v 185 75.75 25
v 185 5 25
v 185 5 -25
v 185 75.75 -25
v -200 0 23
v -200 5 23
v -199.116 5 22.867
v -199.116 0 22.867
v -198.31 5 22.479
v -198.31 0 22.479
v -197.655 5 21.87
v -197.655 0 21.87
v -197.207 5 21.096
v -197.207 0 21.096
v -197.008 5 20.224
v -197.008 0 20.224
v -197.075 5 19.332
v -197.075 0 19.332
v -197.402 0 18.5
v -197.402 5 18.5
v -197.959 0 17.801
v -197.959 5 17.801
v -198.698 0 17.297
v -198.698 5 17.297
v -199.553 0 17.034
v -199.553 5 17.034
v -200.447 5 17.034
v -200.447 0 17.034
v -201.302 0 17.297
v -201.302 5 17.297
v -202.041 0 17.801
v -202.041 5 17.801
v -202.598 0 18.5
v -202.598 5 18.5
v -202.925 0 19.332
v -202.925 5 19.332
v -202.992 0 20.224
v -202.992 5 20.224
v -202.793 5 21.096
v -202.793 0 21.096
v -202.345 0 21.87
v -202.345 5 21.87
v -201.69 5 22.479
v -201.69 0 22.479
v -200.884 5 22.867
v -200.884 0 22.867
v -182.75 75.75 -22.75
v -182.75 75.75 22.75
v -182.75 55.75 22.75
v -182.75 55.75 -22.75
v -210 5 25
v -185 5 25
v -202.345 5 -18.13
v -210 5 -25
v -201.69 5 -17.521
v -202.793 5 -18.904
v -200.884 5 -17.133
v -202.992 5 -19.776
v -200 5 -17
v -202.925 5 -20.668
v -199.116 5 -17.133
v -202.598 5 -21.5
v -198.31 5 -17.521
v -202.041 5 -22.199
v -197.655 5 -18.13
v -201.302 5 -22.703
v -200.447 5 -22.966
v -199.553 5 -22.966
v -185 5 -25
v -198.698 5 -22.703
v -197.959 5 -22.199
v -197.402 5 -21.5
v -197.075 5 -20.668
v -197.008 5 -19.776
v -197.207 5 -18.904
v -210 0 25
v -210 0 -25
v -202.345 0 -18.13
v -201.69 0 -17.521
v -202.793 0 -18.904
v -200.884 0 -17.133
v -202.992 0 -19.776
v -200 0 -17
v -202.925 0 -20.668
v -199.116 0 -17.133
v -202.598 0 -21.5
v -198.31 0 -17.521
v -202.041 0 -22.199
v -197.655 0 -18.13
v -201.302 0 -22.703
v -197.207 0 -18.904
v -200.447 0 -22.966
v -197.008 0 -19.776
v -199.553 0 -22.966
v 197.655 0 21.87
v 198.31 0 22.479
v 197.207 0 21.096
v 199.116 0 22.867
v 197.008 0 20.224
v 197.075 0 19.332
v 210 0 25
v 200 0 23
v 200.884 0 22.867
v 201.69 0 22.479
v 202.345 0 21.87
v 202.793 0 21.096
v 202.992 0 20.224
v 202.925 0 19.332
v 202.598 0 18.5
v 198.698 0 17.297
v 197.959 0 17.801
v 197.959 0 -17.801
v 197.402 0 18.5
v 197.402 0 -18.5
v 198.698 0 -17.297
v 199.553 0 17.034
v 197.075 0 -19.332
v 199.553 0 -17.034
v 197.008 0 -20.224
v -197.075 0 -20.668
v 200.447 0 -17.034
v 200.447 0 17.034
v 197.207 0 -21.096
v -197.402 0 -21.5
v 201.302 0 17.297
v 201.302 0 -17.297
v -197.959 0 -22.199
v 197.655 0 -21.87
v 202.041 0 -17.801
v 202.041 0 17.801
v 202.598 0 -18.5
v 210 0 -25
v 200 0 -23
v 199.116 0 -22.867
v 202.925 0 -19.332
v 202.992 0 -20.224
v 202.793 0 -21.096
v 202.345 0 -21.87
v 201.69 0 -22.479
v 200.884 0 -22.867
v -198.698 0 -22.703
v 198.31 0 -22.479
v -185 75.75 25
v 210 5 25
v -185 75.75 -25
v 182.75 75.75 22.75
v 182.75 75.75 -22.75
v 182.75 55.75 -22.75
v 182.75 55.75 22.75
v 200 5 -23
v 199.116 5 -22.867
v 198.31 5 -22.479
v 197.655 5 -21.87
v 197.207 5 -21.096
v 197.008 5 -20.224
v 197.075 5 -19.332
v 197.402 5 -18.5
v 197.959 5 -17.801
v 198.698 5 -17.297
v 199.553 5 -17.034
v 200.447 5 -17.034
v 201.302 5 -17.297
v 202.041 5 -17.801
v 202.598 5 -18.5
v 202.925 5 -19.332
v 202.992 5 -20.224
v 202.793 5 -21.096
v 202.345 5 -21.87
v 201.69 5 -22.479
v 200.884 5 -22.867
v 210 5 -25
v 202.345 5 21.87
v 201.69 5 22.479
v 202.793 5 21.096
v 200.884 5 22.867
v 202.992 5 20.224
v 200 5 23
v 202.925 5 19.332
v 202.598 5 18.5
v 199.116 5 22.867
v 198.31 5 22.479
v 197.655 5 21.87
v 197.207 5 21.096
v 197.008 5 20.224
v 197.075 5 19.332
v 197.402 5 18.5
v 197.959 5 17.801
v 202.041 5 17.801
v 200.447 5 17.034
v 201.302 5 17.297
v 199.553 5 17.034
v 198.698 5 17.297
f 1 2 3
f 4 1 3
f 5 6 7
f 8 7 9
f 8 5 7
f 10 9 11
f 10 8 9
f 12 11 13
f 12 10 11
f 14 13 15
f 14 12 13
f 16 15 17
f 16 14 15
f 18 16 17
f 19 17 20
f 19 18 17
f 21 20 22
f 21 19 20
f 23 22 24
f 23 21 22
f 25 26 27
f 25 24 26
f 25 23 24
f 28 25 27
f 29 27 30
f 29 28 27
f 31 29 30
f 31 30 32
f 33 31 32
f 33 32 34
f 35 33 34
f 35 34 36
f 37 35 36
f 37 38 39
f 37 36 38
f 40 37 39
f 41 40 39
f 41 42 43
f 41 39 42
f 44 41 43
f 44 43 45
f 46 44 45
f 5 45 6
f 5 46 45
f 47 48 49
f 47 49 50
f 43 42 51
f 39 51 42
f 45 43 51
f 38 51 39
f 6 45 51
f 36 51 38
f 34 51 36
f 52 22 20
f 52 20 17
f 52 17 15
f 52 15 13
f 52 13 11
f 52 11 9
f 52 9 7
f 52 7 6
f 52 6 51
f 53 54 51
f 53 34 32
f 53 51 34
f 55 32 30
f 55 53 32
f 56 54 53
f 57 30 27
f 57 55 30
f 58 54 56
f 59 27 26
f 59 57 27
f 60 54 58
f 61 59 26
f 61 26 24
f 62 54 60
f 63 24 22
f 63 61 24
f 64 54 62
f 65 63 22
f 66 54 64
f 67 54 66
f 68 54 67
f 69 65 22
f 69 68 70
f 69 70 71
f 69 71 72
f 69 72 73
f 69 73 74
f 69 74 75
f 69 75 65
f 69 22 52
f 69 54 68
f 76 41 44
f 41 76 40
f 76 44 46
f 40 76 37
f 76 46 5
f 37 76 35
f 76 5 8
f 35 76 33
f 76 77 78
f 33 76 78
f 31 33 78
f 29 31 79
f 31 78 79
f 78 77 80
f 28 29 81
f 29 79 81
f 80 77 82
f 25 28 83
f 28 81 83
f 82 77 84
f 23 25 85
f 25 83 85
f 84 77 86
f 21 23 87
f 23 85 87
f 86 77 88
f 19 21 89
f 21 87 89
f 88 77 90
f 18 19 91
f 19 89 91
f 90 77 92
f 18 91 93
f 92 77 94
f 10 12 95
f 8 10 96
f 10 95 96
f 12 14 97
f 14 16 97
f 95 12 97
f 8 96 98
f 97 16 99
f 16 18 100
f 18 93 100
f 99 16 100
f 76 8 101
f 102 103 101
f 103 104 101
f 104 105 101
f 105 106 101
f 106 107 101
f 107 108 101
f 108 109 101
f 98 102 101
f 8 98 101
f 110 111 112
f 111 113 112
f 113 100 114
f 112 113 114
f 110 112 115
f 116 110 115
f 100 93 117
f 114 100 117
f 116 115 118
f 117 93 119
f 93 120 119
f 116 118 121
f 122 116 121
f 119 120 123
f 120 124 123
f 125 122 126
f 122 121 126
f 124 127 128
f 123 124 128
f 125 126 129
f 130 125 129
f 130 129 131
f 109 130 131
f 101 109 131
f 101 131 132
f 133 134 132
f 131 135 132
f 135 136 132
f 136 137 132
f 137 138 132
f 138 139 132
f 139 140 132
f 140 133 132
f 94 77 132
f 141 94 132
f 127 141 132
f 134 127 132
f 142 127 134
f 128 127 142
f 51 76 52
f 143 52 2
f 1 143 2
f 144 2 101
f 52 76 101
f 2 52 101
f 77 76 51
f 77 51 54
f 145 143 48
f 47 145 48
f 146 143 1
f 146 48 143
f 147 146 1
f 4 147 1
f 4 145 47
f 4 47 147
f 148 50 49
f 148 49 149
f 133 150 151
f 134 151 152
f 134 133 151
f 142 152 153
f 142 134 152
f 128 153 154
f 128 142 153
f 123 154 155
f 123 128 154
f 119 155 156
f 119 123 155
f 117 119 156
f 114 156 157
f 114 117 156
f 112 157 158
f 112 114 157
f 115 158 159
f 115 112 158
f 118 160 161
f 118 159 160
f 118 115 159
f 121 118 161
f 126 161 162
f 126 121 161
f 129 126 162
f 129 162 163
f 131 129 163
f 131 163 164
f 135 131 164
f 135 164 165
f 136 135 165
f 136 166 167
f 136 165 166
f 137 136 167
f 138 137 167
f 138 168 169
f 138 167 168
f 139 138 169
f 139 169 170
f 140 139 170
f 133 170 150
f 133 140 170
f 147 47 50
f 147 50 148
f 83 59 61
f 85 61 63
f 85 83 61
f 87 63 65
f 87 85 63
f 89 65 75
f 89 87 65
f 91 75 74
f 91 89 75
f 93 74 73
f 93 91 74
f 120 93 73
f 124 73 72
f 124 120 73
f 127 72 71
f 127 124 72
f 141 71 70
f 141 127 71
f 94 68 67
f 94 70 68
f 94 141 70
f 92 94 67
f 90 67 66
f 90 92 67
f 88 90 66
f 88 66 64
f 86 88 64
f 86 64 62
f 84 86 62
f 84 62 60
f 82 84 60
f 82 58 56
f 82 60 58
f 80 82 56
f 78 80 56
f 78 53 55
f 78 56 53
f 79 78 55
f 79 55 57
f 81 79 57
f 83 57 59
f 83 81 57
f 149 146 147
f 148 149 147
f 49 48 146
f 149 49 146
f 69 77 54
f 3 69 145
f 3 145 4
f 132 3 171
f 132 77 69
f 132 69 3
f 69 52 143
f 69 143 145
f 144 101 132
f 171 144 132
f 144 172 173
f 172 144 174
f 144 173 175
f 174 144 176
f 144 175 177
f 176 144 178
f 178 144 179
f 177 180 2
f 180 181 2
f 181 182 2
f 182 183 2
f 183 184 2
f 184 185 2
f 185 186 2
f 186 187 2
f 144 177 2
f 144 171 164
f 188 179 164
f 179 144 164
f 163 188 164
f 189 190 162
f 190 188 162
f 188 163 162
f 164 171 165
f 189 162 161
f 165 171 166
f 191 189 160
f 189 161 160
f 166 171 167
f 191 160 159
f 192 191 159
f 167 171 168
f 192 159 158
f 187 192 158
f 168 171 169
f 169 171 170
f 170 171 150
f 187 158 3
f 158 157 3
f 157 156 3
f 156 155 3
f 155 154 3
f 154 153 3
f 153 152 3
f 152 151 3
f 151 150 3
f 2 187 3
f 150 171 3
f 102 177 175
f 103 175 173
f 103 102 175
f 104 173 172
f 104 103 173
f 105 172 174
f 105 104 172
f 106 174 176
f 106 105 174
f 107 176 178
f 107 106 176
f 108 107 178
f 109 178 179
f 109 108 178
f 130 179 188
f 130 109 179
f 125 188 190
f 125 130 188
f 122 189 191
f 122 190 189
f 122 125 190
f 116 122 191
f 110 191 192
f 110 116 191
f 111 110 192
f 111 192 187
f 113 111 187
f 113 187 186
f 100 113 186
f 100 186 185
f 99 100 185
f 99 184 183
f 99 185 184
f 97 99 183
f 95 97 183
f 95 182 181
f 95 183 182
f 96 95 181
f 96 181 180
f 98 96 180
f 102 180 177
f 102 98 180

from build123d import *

# Parameters (mm, degrees)
SKETCH1_W           = 420
SKETCH1_H           = 50
SKETCH1_R           = 3
BOSS_EXTRUDE1_DEPTH = 75.75
SKETCH2_W           = 365.5
SKETCH2_H           = 45.5
CUT_EXTRUDE1_DEPTH  = 20
SKETCH3_W           = 25
SKETCH3_H           = 50
CUT_EXTRUDE2_DEPTH  = 70.75


with BuildPart() as part:
    # Sketch1 → Boss-Extrude1 (new body)
    with BuildSketch(Plane(origin=(0, 0, 0), x_dir=(1, 0, 0), z_dir=(0, 1, 0))):
        Rectangle(SKETCH1_W, SKETCH1_H)
        with Locations(Location((-200, -20, 0), (0, 0, 270))):
            Circle(SKETCH1_R, mode=Mode.SUBTRACT)
        with Locations(Location((200, -20, 0), (0, 0, 270))):
            Circle(SKETCH1_R, mode=Mode.SUBTRACT)
        with Locations(Location((-200, 20, 0), (0, 0, 270))):
            Circle(SKETCH1_R, mode=Mode.SUBTRACT)
        with Locations(Location((200, 20, 0), (0, 0, 90))):
            Circle(SKETCH1_R, mode=Mode.SUBTRACT)
    extrude(amount=BOSS_EXTRUDE1_DEPTH)

    # Sketch2 → Cut-Extrude1 (cut)
    with BuildSketch(Plane(origin=(0, 75.75, 0), x_dir=(1, 0, 0), z_dir=(0, 1, 0))):
        Rectangle(SKETCH2_W, SKETCH2_H)
    extrude(amount=-CUT_EXTRUDE1_DEPTH, mode=Mode.SUBTRACT)

    # Sketch3 → Cut-Extrude2 (cut)
    with BuildSketch(Plane(origin=(0, 75.75, 0), x_dir=(1, 0, 0), z_dir=(0, 1, 0))):
        with Locations((-197.5, 0)):
            Rectangle(SKETCH3_W, SKETCH3_H)
    cut_extrude2 = extrude(amount=-CUT_EXTRUDE2_DEPTH, mode=Mode.SUBTRACT)

    # Mirror1: Cut-Extrude2 across plane
    add(cut_extrude2.mirror(Plane(origin=(0, 0, 0), x_dir=(0, 0, 1), z_dir=(1, 0, 0))), mode=Mode.SUBTRACT)


solid = part.part
